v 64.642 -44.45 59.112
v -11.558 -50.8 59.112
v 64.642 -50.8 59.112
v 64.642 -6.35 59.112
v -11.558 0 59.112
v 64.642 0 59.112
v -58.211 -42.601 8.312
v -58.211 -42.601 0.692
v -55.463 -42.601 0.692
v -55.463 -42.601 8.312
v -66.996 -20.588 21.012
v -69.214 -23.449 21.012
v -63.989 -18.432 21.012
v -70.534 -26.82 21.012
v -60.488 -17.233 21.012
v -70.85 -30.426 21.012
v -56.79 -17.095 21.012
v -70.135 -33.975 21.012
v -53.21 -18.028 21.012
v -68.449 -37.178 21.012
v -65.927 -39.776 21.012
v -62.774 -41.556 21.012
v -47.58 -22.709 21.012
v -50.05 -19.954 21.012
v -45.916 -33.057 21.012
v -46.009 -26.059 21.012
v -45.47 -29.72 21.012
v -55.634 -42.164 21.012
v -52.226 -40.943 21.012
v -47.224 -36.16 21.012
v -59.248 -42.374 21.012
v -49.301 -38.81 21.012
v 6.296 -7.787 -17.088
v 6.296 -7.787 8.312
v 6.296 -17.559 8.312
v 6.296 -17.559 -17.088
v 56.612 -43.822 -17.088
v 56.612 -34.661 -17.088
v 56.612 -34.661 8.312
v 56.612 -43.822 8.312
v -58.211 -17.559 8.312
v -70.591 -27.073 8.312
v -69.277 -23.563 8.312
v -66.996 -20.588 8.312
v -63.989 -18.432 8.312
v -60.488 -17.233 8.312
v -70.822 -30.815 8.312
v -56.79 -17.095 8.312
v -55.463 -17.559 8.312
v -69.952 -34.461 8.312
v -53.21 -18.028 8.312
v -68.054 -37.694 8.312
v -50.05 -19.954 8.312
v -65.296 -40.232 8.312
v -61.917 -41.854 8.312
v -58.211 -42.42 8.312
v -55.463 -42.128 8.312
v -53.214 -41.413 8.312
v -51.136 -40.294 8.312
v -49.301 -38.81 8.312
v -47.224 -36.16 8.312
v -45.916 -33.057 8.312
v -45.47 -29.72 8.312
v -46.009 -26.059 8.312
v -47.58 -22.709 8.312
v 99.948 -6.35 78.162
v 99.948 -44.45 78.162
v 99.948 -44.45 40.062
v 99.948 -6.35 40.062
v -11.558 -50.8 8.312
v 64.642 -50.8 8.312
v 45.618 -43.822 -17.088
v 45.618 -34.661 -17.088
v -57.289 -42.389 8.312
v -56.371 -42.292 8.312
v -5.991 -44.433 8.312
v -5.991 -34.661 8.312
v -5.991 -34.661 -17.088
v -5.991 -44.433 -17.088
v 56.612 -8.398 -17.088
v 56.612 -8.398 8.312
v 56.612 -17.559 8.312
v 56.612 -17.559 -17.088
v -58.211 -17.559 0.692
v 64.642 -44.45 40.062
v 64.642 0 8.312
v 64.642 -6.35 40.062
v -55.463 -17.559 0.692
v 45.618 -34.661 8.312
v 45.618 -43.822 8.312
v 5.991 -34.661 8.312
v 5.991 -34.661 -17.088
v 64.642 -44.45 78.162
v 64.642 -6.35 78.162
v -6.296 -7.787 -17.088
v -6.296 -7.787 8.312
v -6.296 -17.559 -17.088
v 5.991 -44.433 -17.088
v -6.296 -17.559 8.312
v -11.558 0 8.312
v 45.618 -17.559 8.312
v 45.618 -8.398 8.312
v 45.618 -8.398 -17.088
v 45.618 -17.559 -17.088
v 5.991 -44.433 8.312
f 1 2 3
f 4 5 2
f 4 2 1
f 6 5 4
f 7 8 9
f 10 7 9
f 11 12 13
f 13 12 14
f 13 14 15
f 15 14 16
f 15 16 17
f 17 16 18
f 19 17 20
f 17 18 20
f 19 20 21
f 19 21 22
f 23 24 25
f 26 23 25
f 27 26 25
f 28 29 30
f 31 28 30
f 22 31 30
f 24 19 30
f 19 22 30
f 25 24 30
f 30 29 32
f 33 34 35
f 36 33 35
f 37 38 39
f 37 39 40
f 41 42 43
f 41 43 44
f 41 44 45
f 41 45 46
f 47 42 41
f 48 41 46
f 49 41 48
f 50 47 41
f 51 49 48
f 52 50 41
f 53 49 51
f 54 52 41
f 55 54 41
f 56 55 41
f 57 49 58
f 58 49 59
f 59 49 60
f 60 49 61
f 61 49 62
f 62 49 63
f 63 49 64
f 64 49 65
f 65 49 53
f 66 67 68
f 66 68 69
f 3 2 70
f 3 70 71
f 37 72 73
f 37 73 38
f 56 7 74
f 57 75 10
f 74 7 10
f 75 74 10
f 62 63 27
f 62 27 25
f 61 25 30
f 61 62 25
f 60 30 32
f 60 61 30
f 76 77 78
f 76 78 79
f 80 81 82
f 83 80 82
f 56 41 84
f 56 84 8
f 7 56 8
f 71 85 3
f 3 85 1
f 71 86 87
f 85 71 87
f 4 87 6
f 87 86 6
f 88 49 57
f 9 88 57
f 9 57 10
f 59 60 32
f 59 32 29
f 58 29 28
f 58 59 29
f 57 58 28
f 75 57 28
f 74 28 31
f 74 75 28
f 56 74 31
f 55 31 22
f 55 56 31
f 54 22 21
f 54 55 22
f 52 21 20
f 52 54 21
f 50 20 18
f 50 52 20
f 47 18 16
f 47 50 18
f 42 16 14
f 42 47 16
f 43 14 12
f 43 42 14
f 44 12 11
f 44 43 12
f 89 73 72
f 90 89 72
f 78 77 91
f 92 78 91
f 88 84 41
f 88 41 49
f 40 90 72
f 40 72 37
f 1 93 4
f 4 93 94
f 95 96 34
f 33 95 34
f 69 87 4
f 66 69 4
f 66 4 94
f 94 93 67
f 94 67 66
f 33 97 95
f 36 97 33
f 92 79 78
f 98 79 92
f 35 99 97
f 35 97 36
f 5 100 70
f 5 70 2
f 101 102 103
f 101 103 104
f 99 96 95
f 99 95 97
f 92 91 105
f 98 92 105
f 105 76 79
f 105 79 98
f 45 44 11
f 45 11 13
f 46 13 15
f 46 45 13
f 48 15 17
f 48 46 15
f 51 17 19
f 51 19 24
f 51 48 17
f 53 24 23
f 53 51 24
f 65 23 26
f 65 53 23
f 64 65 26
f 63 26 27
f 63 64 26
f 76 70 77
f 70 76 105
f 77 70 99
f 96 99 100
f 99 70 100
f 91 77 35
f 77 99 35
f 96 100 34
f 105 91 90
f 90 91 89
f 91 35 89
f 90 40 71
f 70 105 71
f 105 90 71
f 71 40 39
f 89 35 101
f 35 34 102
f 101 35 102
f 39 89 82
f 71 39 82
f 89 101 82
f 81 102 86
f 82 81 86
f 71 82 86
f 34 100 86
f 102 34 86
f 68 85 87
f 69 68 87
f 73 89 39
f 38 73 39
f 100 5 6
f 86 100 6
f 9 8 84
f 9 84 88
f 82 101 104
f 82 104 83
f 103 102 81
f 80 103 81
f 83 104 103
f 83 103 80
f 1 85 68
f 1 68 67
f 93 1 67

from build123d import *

# Parameters (mm, degrees)
F0_W      = 76.2
F0_H      = 50.8
F1_DEPTH  = 50.8
F2_W      = 38.1
F2_H      = 38.1
F3_DEPTH  = 35.306
F4_W      = 11.982116
F4_H      = 9.772219
F4_W_2    = 12.59288
F4_H_2    = 9.772213
F4_W_3    = 10.993734
F4_H_3    = 9.161458
F4_H_4    = 9.16145
F5_DEPTH  = 25.4
F6_R      = 12.7
F7_DEPTH  = 12.7
F9_DEPTH  = 12.7
F10_W     = 2.748438
F10_H     = 25.041297
F11_DEPTH = 7.62
F12_DEPTH = 25.4


with BuildPart() as f1:
    # F0 (on Front) → F1 (new body)
    with BuildSketch(Plane.XZ):
        with Locations((26.541545, 33.711883)):
            Rectangle(F0_W, F0_H)
    extrude(amount=F1_DEPTH)

    # F2 (on face) → F3 (join)
    with BuildSketch(Plane.YZ.offset(64.641545)):
        with Locations((-25.4, 59.111883)):
            Rectangle(F2_W, F2_H)
    extrude(amount=F3_DEPTH)

    # F4 (on face) → F5 (join)
    with BuildSketch(Plane(origin=(0, 0, 8.311883), x_dir=(1, 0, 0), z_dir=(0, 0, -1))):
        with Locations((0, 39.546926)):
            Rectangle(F4_W, F4_H)
        with Locations((0, 12.673339)):
            Rectangle(F4_W_2, F4_H_2)
        with Locations((51.115319, 39.241545)):
            Rectangle(F4_W_3, F4_H_3)
        with Locations((51.115319, 12.978721)):
            Rectangle(F4_W_3, F4_H_4)
    extrude(amount=F5_DEPTH)

    # F6 (on face) → F7 (join)
    with BuildSketch(Plane(origin=(0, 0, 8.311883), x_dir=(1, 0, 0), z_dir=(0, 0, -1))):
        with BuildLine():
            Line((-66.995779, 20.58823), (-49.30094, 38.810447))
            ThreePointArc((-49.30094, 38.810447), (-67.280696, 38.567372), (-66.995779, 20.58823))
        make_face()
        with BuildLine():
            ThreePointArc((-66.995779, 20.58823), (-53.209873, 18.028416), (-45.469563, 29.719929))
            ThreePointArc((-45.469563, 29.719929), (-46.46654, 34.652397), (-49.30094, 38.810447))
            Line((-49.30094, 38.810447), (-66.995779, 20.58823))
        make_face()
        with Locations((23.623225, 26.436275)):
            Circle(F6_R)
    extrude(amount=-F7_DEPTH)

    # F6 (on face) → F9 (join)
    with BuildSketch(Plane(origin=(0, 0, 8.311883), x_dir=(1, 0, 0), z_dir=(0, 0, -1))):
        with Locations((23.623225, 26.436275)):
            Circle(F6_R)
    extrude(amount=-F9_DEPTH)

    # F10 (on face) → F11 (join)
    with BuildSketch(Plane(origin=(0, 0, 8.311883), x_dir=(1, 0, 0), z_dir=(0, 0, -1))):
        with Locations((-56.837108, 30.080095)):
            Rectangle(F10_W, F10_H)
    extrude(amount=F11_DEPTH)

    # F6 (on face) → F12 (join)
    with BuildSketch(Plane(origin=(0, 0, 8.311883), x_dir=(1, 0, 0), z_dir=(0, 0, -1))):
        with Locations((23.623225, 26.436275)):
            Circle(F6_R)
    extrude(amount=-F12_DEPTH)


solid = f1.part
